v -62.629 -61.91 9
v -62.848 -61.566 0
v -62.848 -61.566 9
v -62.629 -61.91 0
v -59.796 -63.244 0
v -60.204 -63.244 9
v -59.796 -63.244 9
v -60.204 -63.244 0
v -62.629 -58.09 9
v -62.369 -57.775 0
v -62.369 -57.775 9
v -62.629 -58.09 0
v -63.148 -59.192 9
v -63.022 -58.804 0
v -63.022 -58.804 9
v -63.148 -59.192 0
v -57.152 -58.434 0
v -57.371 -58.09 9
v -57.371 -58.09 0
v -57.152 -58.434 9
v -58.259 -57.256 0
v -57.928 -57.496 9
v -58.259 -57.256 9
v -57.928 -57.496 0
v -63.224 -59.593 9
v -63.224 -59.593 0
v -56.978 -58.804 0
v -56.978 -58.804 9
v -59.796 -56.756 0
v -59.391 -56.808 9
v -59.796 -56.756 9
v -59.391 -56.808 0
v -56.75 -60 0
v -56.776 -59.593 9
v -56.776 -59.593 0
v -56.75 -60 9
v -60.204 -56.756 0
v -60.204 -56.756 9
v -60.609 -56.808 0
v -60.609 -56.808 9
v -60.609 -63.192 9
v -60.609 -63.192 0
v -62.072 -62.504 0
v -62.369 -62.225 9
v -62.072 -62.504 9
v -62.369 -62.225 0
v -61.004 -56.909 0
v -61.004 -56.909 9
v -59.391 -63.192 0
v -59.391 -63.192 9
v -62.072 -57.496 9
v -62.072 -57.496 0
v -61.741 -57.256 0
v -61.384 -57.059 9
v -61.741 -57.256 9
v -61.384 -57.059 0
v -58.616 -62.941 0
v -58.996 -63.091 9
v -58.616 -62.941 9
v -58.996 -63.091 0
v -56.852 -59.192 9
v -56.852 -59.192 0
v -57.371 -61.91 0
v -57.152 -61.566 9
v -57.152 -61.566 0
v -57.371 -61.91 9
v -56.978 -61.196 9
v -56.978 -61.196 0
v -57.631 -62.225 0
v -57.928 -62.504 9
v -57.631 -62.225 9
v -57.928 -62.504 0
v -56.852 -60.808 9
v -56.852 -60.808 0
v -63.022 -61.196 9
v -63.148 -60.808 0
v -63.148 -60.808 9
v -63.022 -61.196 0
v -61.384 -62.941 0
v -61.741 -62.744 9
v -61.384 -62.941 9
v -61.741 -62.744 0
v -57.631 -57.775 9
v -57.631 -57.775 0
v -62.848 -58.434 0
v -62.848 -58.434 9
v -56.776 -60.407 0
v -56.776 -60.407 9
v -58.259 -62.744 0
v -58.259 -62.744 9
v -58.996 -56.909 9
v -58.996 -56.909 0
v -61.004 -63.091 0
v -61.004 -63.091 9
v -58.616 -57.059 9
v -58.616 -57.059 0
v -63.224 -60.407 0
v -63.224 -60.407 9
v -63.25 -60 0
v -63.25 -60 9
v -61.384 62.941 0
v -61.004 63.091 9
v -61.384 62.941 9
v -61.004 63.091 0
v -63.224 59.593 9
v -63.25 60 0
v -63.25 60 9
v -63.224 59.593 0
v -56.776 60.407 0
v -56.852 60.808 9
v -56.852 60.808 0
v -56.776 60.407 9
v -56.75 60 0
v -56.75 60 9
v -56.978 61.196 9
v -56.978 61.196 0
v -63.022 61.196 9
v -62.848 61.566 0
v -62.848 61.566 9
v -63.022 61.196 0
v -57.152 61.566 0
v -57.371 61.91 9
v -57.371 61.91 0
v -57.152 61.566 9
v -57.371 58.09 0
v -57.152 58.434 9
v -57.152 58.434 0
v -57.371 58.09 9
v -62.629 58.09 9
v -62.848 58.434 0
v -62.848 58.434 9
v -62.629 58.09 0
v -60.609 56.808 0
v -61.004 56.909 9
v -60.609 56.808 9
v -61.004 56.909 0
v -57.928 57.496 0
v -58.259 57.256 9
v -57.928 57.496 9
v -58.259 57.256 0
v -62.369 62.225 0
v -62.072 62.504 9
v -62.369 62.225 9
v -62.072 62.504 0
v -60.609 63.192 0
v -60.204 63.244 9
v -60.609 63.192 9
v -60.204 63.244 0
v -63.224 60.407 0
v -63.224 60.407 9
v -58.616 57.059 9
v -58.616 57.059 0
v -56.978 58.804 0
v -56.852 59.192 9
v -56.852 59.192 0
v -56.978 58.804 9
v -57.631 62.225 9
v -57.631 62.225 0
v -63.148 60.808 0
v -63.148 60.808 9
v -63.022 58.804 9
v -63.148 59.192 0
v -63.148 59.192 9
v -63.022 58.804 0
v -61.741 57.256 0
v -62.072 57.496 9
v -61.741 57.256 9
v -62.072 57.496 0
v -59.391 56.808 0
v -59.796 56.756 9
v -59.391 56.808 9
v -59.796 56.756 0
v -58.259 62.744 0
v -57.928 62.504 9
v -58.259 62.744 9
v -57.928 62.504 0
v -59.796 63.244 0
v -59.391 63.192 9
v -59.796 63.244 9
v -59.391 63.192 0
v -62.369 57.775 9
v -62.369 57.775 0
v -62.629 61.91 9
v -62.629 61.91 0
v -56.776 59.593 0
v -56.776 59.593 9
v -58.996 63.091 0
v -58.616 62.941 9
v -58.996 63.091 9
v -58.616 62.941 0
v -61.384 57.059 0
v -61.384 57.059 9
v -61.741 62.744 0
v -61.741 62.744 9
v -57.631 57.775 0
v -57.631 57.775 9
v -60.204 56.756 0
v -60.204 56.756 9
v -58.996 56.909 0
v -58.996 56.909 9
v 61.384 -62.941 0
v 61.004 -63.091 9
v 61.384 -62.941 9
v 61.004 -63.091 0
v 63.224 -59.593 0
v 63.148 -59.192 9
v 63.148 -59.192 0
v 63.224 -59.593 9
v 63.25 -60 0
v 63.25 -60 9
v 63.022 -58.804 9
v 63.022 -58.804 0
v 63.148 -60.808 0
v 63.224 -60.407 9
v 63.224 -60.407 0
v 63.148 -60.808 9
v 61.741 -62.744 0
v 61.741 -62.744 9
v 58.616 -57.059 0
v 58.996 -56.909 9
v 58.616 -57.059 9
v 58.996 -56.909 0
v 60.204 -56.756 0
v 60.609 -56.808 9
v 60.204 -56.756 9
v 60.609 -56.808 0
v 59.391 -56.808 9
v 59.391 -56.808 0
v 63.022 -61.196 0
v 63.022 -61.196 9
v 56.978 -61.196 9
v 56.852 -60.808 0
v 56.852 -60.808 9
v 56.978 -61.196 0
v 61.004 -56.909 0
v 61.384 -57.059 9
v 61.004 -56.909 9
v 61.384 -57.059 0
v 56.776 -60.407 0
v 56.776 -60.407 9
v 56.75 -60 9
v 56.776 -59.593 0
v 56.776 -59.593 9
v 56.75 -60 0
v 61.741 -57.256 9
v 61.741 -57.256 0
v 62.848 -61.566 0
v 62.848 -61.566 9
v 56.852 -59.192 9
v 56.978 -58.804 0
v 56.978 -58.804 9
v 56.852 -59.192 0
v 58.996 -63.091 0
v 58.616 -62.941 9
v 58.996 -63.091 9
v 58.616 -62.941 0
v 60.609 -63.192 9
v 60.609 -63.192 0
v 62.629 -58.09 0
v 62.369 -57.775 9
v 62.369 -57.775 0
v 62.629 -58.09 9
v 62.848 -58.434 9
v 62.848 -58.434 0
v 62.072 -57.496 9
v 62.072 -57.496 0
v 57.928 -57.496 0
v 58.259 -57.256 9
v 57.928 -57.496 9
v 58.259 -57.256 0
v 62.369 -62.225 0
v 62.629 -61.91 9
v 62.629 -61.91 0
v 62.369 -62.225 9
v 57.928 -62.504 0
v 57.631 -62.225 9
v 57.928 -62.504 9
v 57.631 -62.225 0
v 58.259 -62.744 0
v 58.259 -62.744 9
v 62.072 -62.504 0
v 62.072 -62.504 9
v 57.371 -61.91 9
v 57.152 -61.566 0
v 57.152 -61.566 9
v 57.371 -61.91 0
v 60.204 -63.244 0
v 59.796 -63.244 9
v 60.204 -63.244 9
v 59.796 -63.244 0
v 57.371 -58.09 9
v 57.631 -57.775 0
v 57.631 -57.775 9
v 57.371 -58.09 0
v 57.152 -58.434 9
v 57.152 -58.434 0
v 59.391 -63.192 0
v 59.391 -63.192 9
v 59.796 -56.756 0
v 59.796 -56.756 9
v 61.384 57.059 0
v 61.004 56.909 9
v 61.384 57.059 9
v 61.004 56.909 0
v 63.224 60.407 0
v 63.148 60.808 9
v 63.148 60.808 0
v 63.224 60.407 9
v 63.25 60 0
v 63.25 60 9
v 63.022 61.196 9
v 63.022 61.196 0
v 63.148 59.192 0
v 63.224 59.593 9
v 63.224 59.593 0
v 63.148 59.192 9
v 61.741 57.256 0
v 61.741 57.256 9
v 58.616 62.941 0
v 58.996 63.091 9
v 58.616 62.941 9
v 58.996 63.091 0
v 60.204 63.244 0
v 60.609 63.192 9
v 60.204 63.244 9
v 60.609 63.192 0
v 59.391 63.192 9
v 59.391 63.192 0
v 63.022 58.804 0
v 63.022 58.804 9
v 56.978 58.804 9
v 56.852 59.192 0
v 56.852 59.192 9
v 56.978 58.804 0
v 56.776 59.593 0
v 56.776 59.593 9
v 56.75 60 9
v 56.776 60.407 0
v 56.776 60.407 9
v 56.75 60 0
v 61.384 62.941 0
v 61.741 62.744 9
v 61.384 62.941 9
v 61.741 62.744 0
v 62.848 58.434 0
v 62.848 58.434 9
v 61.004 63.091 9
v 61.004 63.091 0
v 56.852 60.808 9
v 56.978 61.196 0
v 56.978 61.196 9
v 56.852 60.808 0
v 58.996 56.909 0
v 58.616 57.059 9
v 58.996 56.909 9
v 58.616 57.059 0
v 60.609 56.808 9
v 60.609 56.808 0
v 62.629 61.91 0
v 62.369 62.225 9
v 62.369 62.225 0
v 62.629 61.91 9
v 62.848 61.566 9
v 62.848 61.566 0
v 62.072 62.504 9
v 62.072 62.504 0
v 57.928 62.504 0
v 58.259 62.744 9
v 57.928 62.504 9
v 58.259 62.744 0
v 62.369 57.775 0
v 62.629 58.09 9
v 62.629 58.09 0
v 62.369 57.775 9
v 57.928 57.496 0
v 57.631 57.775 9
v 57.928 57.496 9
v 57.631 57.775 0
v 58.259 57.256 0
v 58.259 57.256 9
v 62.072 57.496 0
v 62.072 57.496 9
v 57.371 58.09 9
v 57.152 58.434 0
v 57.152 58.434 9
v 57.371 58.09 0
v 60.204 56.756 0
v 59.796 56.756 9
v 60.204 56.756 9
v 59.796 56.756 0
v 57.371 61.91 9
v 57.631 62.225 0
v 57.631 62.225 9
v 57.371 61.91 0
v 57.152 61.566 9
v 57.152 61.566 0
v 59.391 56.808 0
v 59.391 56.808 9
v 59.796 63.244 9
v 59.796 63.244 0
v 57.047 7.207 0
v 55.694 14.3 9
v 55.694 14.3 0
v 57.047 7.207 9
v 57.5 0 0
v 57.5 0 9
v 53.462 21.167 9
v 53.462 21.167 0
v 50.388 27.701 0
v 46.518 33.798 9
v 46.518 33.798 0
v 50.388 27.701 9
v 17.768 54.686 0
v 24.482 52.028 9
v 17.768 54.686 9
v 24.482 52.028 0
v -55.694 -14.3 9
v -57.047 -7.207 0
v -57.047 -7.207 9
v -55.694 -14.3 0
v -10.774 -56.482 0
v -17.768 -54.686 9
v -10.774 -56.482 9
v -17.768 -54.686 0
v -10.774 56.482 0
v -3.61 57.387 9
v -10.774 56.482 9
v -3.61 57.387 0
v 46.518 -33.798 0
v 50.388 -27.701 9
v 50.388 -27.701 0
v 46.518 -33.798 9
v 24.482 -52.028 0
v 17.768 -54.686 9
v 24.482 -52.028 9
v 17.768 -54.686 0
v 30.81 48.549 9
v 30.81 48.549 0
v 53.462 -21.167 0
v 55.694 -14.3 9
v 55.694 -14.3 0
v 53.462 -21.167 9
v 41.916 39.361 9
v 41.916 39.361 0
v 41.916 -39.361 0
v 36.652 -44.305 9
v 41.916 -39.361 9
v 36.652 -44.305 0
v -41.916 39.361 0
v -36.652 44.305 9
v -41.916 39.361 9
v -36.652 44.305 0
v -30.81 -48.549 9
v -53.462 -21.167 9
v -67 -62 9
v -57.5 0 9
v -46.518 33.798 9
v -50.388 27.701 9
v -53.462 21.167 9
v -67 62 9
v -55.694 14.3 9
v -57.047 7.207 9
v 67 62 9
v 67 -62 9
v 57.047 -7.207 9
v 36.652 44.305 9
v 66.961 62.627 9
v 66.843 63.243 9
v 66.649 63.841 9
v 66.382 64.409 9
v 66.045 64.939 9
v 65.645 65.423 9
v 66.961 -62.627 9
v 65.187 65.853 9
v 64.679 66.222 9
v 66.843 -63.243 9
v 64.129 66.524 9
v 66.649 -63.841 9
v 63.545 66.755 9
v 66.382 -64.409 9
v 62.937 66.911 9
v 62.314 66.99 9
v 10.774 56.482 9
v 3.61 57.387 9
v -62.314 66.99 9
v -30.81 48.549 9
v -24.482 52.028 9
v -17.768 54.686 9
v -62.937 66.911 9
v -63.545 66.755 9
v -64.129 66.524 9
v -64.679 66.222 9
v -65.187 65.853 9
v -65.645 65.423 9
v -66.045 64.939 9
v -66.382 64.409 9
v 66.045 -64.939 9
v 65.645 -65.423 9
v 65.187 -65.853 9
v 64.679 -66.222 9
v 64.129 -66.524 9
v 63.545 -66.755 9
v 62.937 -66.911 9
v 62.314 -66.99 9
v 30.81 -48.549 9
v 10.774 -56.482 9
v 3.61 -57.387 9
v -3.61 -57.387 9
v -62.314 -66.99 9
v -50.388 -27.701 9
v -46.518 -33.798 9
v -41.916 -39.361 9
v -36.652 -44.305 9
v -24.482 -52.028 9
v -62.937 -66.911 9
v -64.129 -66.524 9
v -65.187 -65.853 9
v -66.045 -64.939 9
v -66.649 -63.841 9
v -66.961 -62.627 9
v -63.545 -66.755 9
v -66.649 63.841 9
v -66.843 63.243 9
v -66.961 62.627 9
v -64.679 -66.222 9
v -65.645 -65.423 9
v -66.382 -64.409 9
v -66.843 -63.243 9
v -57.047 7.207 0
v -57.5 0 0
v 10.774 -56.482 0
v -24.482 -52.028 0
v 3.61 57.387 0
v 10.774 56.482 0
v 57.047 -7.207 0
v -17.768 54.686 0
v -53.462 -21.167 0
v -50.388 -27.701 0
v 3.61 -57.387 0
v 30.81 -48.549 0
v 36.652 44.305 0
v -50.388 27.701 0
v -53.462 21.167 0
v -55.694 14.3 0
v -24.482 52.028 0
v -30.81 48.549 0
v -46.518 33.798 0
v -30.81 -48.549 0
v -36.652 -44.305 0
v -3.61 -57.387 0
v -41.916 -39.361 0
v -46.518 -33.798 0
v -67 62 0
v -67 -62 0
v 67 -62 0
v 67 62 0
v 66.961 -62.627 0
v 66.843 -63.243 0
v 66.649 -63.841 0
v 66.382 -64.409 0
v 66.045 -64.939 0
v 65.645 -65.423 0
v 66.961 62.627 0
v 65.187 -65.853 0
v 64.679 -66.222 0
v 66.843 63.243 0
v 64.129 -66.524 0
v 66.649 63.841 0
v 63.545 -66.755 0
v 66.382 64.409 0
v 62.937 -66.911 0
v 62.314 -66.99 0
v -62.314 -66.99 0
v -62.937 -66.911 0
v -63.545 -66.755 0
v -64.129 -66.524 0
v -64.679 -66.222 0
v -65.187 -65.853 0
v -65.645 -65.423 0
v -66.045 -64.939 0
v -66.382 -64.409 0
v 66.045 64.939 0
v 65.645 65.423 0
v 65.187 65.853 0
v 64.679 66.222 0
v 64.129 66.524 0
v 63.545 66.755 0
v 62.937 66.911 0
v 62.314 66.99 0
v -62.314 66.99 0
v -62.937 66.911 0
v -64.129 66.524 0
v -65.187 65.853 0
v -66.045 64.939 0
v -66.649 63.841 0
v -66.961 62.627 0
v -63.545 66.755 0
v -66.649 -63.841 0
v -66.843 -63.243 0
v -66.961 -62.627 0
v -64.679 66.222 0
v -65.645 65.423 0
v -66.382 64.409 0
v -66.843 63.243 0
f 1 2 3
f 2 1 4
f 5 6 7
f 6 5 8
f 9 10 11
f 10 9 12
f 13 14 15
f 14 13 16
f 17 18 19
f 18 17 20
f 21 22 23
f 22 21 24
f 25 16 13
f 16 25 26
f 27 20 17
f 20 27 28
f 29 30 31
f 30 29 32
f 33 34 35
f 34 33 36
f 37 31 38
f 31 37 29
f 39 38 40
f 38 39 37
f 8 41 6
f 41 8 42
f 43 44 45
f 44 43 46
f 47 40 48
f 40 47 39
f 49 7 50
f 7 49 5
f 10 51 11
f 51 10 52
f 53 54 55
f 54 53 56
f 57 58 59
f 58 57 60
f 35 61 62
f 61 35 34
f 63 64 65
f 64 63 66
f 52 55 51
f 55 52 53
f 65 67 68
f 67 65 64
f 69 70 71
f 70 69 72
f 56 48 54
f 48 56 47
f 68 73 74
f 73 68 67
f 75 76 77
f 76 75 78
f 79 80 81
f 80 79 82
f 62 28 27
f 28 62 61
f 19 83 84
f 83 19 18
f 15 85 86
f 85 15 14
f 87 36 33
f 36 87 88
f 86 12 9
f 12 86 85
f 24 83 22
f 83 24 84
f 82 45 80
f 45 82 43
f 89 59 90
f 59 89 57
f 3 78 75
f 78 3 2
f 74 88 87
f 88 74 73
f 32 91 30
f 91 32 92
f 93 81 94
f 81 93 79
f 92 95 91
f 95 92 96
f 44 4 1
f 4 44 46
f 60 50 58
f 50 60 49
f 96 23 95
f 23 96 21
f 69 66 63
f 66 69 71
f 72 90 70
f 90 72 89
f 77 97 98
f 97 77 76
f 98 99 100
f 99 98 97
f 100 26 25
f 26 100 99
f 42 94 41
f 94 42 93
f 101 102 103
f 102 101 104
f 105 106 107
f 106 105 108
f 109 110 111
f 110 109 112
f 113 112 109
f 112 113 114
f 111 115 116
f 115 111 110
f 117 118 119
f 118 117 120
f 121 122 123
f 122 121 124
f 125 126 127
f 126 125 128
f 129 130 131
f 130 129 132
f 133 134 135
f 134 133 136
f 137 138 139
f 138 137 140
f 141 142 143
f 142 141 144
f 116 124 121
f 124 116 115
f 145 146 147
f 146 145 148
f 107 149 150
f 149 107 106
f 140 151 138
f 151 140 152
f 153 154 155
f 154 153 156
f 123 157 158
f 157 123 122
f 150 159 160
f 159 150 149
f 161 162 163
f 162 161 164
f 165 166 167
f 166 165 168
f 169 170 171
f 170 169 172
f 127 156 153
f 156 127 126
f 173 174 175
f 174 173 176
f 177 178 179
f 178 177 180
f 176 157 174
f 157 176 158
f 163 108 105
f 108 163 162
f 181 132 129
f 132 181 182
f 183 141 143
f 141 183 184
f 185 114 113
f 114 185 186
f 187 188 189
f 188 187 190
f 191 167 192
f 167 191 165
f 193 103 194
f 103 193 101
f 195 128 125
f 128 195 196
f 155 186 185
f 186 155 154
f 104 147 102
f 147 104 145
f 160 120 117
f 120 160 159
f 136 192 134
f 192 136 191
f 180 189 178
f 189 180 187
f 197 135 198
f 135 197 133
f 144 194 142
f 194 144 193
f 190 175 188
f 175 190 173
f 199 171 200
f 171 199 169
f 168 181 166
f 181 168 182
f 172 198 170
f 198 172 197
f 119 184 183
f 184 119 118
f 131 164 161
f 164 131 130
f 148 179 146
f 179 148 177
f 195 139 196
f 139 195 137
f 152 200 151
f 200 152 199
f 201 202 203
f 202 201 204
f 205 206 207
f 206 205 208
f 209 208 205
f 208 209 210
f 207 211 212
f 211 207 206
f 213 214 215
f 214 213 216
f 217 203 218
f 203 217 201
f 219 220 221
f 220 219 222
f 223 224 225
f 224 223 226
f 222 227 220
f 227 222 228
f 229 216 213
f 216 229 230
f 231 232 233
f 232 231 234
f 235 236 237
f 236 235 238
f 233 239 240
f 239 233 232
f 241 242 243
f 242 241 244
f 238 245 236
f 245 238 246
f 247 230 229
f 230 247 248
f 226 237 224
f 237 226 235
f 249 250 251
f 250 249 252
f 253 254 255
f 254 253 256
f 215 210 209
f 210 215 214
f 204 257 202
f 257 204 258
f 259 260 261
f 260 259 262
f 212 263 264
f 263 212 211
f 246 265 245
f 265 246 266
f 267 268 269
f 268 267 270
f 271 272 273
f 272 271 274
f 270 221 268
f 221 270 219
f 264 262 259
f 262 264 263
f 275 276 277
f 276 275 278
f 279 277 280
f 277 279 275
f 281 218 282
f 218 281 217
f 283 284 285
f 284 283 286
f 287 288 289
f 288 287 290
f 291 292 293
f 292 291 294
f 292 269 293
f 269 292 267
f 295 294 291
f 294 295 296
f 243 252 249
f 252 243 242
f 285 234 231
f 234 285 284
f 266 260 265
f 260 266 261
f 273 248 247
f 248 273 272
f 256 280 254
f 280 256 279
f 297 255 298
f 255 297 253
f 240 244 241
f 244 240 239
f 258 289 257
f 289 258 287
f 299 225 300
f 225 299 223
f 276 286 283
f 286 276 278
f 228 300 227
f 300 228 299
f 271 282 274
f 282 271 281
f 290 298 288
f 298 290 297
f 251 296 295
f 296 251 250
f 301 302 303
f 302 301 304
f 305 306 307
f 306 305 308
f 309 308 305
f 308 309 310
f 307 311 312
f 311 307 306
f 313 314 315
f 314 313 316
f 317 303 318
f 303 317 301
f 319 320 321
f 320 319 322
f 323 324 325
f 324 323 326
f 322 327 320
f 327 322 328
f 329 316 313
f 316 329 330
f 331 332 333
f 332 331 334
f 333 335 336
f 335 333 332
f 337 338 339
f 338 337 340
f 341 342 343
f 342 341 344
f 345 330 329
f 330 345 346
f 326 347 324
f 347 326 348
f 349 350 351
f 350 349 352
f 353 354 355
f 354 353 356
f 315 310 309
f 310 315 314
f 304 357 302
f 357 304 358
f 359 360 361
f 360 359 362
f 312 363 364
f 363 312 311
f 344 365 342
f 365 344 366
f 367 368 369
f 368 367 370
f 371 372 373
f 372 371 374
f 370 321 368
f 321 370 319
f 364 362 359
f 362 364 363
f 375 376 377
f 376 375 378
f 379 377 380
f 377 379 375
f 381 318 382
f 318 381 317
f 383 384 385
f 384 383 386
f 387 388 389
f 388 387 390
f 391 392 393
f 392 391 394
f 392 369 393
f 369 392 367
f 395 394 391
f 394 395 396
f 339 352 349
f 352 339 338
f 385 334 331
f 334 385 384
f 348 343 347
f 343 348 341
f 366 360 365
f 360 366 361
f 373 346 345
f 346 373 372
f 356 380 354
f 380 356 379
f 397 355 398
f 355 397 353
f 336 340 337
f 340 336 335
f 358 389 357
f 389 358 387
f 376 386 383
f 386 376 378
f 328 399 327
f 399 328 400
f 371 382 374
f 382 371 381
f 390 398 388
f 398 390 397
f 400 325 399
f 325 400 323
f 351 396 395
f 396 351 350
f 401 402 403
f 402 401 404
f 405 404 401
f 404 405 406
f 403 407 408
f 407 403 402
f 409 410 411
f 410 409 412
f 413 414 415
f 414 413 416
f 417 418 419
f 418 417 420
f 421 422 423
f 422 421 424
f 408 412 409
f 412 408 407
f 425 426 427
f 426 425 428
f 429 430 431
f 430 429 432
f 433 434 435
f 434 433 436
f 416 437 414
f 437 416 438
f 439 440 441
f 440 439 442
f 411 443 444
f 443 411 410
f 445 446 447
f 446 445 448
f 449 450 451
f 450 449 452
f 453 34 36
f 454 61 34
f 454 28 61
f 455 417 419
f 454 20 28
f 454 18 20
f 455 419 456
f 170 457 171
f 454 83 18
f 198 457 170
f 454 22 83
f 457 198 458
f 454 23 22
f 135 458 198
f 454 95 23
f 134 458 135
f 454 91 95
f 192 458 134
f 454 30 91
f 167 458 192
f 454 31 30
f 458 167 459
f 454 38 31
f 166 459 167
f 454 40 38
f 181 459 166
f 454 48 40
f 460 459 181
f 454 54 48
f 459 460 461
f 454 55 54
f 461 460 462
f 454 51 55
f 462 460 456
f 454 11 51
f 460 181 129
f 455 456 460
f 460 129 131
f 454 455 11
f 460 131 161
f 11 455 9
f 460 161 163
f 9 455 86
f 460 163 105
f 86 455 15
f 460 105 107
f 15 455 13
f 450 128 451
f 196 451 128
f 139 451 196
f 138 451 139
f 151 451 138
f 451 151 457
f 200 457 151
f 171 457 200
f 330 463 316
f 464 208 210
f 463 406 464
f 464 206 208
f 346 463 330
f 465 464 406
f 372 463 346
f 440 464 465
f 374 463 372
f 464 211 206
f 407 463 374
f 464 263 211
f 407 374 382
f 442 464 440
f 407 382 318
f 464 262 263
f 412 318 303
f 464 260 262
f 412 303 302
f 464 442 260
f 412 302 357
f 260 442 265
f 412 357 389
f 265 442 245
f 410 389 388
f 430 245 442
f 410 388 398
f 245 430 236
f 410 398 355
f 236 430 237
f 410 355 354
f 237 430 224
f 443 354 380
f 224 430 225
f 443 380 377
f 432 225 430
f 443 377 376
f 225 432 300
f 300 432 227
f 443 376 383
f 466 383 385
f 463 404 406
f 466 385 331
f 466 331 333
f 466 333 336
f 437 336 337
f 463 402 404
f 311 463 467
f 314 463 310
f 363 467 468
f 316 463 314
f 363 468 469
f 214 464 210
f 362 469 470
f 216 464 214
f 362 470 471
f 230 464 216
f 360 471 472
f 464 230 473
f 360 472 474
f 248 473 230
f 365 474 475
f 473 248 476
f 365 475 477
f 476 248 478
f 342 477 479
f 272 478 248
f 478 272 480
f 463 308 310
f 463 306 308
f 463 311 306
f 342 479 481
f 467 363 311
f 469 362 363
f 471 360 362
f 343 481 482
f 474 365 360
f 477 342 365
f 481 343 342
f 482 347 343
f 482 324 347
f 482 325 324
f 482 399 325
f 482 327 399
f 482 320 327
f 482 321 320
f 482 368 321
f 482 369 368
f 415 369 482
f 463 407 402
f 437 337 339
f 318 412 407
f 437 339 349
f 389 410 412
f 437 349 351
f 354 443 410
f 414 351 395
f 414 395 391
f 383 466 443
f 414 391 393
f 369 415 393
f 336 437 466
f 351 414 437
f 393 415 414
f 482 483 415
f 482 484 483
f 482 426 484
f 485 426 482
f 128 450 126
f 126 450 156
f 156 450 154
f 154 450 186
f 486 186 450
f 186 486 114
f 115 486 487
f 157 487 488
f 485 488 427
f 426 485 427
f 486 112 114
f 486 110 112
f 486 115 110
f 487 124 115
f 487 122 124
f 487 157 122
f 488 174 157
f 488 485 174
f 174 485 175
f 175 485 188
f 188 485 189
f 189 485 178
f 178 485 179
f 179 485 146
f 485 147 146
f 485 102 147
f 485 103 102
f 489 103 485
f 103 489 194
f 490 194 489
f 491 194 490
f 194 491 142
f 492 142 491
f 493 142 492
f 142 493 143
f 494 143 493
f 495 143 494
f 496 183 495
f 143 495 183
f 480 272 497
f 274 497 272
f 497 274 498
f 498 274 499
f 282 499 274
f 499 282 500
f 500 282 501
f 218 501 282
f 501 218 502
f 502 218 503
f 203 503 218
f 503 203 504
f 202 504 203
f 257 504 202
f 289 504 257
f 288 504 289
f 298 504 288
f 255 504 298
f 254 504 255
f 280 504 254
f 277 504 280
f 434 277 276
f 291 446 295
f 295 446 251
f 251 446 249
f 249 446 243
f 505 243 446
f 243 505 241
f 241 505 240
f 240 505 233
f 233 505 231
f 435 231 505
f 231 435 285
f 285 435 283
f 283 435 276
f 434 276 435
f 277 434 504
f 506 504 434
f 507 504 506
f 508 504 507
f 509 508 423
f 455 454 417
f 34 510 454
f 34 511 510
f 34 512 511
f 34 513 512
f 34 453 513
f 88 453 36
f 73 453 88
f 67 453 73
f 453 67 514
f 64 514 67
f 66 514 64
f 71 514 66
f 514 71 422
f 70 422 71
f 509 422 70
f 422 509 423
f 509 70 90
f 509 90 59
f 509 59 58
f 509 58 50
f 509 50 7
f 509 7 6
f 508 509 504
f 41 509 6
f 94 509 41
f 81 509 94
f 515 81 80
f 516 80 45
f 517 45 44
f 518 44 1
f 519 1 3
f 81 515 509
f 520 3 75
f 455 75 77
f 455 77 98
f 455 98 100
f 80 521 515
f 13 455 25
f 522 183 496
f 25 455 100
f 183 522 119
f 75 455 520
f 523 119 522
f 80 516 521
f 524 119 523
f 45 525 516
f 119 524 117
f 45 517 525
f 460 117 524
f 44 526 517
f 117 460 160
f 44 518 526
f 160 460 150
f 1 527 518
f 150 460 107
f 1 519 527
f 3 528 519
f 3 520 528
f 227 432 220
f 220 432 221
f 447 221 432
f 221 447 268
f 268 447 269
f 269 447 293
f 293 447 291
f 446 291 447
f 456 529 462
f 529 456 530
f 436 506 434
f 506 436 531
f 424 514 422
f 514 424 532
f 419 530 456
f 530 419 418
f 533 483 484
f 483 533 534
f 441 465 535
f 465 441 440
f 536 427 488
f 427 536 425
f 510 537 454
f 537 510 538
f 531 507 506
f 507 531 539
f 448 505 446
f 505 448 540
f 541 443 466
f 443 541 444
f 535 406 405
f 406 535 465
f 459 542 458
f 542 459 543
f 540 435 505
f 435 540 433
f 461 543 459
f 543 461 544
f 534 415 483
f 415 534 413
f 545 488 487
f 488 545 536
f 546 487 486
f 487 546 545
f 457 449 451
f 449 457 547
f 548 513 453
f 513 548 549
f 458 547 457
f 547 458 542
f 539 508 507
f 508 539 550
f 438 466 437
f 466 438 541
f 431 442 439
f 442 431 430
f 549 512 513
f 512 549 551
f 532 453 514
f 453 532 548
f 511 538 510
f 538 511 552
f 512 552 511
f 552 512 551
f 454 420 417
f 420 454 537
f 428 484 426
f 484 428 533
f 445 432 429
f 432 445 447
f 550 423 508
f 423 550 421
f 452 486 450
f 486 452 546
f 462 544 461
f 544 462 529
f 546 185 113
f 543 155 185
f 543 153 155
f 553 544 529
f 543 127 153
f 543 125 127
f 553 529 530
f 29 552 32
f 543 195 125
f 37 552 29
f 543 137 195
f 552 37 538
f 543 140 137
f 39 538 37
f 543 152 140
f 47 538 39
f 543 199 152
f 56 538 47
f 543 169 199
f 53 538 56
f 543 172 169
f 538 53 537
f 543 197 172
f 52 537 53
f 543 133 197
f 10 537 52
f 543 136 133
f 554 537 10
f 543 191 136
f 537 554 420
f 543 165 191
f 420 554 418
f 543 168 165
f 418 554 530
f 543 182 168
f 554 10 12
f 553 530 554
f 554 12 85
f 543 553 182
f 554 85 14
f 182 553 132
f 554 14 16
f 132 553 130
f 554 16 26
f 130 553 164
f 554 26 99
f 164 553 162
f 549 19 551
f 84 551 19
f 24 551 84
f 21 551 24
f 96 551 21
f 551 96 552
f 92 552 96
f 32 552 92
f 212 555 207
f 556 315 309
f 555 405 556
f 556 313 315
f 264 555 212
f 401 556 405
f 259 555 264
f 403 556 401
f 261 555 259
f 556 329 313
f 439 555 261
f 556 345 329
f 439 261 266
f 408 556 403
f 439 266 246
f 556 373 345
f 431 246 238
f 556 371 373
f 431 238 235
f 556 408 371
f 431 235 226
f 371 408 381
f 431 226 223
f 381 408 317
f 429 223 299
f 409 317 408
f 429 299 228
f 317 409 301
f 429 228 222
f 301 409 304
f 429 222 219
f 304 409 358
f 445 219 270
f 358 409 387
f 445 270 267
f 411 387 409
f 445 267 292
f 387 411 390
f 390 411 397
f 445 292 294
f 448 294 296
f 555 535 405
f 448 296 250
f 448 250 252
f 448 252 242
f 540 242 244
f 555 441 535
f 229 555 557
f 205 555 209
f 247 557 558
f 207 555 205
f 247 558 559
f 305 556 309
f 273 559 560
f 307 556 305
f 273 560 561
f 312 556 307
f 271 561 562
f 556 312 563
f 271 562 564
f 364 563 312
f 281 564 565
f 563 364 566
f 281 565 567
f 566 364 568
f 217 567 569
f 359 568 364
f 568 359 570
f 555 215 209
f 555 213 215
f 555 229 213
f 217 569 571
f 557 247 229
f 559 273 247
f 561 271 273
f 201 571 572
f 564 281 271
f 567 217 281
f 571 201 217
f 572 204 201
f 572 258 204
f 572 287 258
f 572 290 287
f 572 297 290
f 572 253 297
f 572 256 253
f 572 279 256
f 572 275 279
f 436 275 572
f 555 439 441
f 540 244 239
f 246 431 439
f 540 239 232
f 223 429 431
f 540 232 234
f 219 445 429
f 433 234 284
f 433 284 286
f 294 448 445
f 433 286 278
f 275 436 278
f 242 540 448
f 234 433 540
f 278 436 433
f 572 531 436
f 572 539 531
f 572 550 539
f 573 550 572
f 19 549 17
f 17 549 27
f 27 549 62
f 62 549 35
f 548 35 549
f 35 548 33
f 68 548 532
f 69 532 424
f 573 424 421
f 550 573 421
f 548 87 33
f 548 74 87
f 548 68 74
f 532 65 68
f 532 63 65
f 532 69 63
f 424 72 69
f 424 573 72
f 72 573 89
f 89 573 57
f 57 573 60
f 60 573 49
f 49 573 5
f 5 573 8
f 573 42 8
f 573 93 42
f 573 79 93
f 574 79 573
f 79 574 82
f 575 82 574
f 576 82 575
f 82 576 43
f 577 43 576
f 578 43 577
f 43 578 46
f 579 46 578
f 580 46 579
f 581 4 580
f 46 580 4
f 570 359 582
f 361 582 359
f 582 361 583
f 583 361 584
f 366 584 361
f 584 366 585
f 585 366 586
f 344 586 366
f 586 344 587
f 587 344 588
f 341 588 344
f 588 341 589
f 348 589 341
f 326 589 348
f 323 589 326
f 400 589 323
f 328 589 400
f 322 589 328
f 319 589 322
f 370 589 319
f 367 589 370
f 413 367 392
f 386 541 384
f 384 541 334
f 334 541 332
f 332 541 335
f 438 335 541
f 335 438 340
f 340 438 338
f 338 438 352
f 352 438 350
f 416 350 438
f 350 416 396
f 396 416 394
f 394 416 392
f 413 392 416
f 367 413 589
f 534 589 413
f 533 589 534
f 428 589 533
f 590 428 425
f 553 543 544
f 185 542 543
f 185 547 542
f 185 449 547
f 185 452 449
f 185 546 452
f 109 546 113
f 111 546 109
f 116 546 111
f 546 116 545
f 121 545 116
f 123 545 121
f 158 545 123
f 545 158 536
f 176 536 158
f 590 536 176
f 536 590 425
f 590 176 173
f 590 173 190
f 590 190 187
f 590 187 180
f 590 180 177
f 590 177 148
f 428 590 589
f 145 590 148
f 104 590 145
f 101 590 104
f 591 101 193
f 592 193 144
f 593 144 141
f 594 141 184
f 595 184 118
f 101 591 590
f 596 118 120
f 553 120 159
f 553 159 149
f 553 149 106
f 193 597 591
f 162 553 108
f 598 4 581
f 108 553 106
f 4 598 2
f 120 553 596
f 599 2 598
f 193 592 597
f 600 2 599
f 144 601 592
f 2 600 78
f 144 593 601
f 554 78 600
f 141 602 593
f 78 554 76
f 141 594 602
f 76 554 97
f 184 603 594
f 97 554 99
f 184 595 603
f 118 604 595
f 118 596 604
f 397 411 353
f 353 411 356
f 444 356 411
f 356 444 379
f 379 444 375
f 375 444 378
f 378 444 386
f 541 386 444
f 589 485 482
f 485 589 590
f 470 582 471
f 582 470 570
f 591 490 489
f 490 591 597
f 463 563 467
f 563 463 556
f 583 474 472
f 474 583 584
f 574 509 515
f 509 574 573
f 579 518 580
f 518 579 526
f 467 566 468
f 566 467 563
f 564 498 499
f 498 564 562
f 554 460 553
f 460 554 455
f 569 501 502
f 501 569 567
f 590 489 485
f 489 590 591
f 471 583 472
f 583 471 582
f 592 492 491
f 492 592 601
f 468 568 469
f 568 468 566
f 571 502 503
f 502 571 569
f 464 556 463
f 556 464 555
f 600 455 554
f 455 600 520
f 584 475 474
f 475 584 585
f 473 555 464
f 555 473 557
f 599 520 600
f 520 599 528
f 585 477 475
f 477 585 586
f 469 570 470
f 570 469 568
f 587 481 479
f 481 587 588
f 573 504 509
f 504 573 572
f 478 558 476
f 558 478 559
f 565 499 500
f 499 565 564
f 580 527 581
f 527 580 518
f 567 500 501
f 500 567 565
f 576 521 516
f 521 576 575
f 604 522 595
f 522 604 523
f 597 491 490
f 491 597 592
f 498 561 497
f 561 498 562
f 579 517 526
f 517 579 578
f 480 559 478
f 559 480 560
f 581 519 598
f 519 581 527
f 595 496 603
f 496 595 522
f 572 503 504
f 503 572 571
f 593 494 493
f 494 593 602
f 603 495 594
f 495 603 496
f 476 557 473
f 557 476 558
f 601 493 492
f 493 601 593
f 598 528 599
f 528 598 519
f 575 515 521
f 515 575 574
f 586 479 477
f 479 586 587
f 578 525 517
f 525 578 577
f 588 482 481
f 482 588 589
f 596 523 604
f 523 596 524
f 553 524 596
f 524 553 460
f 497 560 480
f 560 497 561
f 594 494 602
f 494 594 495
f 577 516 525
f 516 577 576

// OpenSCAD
$fn = 50;


difference() {
	union() {
		hull() {
			translate(v = [-62.0000000000, 62.0000000000, 0]) {
				cylinder(h = 9, r = 5);
			}
			translate(v = [62.0000000000, 62.0000000000, 0]) {
				cylinder(h = 9, r = 5);
			}
			translate(v = [-62.0000000000, -62.0000000000, 0]) {
				cylinder(h = 9, r = 5);
			}
			translate(v = [62.0000000000, -62.0000000000, 0]) {
				cylinder(h = 9, r = 5);
			}
		}
	}
	union() {
		#translate(v = [-60.0000000000, -60.0000000000, -100.0000000000]) {
			cylinder(h = 200, r = 3.2500000000);
		}
		#translate(v = [-60.0000000000, 60.0000000000, -100.0000000000]) {
			cylinder(h = 200, r = 3.2500000000);
		}
		#translate(v = [60.0000000000, -60.0000000000, -100.0000000000]) {
			cylinder(h = 200, r = 3.2500000000);
		}
		#translate(v = [60.0000000000, 60.0000000000, -100.0000000000]) {
			cylinder(h = 200, r = 3.2500000000);
		}
		#cylinder(h = 9, r = 57.5000000000);
	}
}
